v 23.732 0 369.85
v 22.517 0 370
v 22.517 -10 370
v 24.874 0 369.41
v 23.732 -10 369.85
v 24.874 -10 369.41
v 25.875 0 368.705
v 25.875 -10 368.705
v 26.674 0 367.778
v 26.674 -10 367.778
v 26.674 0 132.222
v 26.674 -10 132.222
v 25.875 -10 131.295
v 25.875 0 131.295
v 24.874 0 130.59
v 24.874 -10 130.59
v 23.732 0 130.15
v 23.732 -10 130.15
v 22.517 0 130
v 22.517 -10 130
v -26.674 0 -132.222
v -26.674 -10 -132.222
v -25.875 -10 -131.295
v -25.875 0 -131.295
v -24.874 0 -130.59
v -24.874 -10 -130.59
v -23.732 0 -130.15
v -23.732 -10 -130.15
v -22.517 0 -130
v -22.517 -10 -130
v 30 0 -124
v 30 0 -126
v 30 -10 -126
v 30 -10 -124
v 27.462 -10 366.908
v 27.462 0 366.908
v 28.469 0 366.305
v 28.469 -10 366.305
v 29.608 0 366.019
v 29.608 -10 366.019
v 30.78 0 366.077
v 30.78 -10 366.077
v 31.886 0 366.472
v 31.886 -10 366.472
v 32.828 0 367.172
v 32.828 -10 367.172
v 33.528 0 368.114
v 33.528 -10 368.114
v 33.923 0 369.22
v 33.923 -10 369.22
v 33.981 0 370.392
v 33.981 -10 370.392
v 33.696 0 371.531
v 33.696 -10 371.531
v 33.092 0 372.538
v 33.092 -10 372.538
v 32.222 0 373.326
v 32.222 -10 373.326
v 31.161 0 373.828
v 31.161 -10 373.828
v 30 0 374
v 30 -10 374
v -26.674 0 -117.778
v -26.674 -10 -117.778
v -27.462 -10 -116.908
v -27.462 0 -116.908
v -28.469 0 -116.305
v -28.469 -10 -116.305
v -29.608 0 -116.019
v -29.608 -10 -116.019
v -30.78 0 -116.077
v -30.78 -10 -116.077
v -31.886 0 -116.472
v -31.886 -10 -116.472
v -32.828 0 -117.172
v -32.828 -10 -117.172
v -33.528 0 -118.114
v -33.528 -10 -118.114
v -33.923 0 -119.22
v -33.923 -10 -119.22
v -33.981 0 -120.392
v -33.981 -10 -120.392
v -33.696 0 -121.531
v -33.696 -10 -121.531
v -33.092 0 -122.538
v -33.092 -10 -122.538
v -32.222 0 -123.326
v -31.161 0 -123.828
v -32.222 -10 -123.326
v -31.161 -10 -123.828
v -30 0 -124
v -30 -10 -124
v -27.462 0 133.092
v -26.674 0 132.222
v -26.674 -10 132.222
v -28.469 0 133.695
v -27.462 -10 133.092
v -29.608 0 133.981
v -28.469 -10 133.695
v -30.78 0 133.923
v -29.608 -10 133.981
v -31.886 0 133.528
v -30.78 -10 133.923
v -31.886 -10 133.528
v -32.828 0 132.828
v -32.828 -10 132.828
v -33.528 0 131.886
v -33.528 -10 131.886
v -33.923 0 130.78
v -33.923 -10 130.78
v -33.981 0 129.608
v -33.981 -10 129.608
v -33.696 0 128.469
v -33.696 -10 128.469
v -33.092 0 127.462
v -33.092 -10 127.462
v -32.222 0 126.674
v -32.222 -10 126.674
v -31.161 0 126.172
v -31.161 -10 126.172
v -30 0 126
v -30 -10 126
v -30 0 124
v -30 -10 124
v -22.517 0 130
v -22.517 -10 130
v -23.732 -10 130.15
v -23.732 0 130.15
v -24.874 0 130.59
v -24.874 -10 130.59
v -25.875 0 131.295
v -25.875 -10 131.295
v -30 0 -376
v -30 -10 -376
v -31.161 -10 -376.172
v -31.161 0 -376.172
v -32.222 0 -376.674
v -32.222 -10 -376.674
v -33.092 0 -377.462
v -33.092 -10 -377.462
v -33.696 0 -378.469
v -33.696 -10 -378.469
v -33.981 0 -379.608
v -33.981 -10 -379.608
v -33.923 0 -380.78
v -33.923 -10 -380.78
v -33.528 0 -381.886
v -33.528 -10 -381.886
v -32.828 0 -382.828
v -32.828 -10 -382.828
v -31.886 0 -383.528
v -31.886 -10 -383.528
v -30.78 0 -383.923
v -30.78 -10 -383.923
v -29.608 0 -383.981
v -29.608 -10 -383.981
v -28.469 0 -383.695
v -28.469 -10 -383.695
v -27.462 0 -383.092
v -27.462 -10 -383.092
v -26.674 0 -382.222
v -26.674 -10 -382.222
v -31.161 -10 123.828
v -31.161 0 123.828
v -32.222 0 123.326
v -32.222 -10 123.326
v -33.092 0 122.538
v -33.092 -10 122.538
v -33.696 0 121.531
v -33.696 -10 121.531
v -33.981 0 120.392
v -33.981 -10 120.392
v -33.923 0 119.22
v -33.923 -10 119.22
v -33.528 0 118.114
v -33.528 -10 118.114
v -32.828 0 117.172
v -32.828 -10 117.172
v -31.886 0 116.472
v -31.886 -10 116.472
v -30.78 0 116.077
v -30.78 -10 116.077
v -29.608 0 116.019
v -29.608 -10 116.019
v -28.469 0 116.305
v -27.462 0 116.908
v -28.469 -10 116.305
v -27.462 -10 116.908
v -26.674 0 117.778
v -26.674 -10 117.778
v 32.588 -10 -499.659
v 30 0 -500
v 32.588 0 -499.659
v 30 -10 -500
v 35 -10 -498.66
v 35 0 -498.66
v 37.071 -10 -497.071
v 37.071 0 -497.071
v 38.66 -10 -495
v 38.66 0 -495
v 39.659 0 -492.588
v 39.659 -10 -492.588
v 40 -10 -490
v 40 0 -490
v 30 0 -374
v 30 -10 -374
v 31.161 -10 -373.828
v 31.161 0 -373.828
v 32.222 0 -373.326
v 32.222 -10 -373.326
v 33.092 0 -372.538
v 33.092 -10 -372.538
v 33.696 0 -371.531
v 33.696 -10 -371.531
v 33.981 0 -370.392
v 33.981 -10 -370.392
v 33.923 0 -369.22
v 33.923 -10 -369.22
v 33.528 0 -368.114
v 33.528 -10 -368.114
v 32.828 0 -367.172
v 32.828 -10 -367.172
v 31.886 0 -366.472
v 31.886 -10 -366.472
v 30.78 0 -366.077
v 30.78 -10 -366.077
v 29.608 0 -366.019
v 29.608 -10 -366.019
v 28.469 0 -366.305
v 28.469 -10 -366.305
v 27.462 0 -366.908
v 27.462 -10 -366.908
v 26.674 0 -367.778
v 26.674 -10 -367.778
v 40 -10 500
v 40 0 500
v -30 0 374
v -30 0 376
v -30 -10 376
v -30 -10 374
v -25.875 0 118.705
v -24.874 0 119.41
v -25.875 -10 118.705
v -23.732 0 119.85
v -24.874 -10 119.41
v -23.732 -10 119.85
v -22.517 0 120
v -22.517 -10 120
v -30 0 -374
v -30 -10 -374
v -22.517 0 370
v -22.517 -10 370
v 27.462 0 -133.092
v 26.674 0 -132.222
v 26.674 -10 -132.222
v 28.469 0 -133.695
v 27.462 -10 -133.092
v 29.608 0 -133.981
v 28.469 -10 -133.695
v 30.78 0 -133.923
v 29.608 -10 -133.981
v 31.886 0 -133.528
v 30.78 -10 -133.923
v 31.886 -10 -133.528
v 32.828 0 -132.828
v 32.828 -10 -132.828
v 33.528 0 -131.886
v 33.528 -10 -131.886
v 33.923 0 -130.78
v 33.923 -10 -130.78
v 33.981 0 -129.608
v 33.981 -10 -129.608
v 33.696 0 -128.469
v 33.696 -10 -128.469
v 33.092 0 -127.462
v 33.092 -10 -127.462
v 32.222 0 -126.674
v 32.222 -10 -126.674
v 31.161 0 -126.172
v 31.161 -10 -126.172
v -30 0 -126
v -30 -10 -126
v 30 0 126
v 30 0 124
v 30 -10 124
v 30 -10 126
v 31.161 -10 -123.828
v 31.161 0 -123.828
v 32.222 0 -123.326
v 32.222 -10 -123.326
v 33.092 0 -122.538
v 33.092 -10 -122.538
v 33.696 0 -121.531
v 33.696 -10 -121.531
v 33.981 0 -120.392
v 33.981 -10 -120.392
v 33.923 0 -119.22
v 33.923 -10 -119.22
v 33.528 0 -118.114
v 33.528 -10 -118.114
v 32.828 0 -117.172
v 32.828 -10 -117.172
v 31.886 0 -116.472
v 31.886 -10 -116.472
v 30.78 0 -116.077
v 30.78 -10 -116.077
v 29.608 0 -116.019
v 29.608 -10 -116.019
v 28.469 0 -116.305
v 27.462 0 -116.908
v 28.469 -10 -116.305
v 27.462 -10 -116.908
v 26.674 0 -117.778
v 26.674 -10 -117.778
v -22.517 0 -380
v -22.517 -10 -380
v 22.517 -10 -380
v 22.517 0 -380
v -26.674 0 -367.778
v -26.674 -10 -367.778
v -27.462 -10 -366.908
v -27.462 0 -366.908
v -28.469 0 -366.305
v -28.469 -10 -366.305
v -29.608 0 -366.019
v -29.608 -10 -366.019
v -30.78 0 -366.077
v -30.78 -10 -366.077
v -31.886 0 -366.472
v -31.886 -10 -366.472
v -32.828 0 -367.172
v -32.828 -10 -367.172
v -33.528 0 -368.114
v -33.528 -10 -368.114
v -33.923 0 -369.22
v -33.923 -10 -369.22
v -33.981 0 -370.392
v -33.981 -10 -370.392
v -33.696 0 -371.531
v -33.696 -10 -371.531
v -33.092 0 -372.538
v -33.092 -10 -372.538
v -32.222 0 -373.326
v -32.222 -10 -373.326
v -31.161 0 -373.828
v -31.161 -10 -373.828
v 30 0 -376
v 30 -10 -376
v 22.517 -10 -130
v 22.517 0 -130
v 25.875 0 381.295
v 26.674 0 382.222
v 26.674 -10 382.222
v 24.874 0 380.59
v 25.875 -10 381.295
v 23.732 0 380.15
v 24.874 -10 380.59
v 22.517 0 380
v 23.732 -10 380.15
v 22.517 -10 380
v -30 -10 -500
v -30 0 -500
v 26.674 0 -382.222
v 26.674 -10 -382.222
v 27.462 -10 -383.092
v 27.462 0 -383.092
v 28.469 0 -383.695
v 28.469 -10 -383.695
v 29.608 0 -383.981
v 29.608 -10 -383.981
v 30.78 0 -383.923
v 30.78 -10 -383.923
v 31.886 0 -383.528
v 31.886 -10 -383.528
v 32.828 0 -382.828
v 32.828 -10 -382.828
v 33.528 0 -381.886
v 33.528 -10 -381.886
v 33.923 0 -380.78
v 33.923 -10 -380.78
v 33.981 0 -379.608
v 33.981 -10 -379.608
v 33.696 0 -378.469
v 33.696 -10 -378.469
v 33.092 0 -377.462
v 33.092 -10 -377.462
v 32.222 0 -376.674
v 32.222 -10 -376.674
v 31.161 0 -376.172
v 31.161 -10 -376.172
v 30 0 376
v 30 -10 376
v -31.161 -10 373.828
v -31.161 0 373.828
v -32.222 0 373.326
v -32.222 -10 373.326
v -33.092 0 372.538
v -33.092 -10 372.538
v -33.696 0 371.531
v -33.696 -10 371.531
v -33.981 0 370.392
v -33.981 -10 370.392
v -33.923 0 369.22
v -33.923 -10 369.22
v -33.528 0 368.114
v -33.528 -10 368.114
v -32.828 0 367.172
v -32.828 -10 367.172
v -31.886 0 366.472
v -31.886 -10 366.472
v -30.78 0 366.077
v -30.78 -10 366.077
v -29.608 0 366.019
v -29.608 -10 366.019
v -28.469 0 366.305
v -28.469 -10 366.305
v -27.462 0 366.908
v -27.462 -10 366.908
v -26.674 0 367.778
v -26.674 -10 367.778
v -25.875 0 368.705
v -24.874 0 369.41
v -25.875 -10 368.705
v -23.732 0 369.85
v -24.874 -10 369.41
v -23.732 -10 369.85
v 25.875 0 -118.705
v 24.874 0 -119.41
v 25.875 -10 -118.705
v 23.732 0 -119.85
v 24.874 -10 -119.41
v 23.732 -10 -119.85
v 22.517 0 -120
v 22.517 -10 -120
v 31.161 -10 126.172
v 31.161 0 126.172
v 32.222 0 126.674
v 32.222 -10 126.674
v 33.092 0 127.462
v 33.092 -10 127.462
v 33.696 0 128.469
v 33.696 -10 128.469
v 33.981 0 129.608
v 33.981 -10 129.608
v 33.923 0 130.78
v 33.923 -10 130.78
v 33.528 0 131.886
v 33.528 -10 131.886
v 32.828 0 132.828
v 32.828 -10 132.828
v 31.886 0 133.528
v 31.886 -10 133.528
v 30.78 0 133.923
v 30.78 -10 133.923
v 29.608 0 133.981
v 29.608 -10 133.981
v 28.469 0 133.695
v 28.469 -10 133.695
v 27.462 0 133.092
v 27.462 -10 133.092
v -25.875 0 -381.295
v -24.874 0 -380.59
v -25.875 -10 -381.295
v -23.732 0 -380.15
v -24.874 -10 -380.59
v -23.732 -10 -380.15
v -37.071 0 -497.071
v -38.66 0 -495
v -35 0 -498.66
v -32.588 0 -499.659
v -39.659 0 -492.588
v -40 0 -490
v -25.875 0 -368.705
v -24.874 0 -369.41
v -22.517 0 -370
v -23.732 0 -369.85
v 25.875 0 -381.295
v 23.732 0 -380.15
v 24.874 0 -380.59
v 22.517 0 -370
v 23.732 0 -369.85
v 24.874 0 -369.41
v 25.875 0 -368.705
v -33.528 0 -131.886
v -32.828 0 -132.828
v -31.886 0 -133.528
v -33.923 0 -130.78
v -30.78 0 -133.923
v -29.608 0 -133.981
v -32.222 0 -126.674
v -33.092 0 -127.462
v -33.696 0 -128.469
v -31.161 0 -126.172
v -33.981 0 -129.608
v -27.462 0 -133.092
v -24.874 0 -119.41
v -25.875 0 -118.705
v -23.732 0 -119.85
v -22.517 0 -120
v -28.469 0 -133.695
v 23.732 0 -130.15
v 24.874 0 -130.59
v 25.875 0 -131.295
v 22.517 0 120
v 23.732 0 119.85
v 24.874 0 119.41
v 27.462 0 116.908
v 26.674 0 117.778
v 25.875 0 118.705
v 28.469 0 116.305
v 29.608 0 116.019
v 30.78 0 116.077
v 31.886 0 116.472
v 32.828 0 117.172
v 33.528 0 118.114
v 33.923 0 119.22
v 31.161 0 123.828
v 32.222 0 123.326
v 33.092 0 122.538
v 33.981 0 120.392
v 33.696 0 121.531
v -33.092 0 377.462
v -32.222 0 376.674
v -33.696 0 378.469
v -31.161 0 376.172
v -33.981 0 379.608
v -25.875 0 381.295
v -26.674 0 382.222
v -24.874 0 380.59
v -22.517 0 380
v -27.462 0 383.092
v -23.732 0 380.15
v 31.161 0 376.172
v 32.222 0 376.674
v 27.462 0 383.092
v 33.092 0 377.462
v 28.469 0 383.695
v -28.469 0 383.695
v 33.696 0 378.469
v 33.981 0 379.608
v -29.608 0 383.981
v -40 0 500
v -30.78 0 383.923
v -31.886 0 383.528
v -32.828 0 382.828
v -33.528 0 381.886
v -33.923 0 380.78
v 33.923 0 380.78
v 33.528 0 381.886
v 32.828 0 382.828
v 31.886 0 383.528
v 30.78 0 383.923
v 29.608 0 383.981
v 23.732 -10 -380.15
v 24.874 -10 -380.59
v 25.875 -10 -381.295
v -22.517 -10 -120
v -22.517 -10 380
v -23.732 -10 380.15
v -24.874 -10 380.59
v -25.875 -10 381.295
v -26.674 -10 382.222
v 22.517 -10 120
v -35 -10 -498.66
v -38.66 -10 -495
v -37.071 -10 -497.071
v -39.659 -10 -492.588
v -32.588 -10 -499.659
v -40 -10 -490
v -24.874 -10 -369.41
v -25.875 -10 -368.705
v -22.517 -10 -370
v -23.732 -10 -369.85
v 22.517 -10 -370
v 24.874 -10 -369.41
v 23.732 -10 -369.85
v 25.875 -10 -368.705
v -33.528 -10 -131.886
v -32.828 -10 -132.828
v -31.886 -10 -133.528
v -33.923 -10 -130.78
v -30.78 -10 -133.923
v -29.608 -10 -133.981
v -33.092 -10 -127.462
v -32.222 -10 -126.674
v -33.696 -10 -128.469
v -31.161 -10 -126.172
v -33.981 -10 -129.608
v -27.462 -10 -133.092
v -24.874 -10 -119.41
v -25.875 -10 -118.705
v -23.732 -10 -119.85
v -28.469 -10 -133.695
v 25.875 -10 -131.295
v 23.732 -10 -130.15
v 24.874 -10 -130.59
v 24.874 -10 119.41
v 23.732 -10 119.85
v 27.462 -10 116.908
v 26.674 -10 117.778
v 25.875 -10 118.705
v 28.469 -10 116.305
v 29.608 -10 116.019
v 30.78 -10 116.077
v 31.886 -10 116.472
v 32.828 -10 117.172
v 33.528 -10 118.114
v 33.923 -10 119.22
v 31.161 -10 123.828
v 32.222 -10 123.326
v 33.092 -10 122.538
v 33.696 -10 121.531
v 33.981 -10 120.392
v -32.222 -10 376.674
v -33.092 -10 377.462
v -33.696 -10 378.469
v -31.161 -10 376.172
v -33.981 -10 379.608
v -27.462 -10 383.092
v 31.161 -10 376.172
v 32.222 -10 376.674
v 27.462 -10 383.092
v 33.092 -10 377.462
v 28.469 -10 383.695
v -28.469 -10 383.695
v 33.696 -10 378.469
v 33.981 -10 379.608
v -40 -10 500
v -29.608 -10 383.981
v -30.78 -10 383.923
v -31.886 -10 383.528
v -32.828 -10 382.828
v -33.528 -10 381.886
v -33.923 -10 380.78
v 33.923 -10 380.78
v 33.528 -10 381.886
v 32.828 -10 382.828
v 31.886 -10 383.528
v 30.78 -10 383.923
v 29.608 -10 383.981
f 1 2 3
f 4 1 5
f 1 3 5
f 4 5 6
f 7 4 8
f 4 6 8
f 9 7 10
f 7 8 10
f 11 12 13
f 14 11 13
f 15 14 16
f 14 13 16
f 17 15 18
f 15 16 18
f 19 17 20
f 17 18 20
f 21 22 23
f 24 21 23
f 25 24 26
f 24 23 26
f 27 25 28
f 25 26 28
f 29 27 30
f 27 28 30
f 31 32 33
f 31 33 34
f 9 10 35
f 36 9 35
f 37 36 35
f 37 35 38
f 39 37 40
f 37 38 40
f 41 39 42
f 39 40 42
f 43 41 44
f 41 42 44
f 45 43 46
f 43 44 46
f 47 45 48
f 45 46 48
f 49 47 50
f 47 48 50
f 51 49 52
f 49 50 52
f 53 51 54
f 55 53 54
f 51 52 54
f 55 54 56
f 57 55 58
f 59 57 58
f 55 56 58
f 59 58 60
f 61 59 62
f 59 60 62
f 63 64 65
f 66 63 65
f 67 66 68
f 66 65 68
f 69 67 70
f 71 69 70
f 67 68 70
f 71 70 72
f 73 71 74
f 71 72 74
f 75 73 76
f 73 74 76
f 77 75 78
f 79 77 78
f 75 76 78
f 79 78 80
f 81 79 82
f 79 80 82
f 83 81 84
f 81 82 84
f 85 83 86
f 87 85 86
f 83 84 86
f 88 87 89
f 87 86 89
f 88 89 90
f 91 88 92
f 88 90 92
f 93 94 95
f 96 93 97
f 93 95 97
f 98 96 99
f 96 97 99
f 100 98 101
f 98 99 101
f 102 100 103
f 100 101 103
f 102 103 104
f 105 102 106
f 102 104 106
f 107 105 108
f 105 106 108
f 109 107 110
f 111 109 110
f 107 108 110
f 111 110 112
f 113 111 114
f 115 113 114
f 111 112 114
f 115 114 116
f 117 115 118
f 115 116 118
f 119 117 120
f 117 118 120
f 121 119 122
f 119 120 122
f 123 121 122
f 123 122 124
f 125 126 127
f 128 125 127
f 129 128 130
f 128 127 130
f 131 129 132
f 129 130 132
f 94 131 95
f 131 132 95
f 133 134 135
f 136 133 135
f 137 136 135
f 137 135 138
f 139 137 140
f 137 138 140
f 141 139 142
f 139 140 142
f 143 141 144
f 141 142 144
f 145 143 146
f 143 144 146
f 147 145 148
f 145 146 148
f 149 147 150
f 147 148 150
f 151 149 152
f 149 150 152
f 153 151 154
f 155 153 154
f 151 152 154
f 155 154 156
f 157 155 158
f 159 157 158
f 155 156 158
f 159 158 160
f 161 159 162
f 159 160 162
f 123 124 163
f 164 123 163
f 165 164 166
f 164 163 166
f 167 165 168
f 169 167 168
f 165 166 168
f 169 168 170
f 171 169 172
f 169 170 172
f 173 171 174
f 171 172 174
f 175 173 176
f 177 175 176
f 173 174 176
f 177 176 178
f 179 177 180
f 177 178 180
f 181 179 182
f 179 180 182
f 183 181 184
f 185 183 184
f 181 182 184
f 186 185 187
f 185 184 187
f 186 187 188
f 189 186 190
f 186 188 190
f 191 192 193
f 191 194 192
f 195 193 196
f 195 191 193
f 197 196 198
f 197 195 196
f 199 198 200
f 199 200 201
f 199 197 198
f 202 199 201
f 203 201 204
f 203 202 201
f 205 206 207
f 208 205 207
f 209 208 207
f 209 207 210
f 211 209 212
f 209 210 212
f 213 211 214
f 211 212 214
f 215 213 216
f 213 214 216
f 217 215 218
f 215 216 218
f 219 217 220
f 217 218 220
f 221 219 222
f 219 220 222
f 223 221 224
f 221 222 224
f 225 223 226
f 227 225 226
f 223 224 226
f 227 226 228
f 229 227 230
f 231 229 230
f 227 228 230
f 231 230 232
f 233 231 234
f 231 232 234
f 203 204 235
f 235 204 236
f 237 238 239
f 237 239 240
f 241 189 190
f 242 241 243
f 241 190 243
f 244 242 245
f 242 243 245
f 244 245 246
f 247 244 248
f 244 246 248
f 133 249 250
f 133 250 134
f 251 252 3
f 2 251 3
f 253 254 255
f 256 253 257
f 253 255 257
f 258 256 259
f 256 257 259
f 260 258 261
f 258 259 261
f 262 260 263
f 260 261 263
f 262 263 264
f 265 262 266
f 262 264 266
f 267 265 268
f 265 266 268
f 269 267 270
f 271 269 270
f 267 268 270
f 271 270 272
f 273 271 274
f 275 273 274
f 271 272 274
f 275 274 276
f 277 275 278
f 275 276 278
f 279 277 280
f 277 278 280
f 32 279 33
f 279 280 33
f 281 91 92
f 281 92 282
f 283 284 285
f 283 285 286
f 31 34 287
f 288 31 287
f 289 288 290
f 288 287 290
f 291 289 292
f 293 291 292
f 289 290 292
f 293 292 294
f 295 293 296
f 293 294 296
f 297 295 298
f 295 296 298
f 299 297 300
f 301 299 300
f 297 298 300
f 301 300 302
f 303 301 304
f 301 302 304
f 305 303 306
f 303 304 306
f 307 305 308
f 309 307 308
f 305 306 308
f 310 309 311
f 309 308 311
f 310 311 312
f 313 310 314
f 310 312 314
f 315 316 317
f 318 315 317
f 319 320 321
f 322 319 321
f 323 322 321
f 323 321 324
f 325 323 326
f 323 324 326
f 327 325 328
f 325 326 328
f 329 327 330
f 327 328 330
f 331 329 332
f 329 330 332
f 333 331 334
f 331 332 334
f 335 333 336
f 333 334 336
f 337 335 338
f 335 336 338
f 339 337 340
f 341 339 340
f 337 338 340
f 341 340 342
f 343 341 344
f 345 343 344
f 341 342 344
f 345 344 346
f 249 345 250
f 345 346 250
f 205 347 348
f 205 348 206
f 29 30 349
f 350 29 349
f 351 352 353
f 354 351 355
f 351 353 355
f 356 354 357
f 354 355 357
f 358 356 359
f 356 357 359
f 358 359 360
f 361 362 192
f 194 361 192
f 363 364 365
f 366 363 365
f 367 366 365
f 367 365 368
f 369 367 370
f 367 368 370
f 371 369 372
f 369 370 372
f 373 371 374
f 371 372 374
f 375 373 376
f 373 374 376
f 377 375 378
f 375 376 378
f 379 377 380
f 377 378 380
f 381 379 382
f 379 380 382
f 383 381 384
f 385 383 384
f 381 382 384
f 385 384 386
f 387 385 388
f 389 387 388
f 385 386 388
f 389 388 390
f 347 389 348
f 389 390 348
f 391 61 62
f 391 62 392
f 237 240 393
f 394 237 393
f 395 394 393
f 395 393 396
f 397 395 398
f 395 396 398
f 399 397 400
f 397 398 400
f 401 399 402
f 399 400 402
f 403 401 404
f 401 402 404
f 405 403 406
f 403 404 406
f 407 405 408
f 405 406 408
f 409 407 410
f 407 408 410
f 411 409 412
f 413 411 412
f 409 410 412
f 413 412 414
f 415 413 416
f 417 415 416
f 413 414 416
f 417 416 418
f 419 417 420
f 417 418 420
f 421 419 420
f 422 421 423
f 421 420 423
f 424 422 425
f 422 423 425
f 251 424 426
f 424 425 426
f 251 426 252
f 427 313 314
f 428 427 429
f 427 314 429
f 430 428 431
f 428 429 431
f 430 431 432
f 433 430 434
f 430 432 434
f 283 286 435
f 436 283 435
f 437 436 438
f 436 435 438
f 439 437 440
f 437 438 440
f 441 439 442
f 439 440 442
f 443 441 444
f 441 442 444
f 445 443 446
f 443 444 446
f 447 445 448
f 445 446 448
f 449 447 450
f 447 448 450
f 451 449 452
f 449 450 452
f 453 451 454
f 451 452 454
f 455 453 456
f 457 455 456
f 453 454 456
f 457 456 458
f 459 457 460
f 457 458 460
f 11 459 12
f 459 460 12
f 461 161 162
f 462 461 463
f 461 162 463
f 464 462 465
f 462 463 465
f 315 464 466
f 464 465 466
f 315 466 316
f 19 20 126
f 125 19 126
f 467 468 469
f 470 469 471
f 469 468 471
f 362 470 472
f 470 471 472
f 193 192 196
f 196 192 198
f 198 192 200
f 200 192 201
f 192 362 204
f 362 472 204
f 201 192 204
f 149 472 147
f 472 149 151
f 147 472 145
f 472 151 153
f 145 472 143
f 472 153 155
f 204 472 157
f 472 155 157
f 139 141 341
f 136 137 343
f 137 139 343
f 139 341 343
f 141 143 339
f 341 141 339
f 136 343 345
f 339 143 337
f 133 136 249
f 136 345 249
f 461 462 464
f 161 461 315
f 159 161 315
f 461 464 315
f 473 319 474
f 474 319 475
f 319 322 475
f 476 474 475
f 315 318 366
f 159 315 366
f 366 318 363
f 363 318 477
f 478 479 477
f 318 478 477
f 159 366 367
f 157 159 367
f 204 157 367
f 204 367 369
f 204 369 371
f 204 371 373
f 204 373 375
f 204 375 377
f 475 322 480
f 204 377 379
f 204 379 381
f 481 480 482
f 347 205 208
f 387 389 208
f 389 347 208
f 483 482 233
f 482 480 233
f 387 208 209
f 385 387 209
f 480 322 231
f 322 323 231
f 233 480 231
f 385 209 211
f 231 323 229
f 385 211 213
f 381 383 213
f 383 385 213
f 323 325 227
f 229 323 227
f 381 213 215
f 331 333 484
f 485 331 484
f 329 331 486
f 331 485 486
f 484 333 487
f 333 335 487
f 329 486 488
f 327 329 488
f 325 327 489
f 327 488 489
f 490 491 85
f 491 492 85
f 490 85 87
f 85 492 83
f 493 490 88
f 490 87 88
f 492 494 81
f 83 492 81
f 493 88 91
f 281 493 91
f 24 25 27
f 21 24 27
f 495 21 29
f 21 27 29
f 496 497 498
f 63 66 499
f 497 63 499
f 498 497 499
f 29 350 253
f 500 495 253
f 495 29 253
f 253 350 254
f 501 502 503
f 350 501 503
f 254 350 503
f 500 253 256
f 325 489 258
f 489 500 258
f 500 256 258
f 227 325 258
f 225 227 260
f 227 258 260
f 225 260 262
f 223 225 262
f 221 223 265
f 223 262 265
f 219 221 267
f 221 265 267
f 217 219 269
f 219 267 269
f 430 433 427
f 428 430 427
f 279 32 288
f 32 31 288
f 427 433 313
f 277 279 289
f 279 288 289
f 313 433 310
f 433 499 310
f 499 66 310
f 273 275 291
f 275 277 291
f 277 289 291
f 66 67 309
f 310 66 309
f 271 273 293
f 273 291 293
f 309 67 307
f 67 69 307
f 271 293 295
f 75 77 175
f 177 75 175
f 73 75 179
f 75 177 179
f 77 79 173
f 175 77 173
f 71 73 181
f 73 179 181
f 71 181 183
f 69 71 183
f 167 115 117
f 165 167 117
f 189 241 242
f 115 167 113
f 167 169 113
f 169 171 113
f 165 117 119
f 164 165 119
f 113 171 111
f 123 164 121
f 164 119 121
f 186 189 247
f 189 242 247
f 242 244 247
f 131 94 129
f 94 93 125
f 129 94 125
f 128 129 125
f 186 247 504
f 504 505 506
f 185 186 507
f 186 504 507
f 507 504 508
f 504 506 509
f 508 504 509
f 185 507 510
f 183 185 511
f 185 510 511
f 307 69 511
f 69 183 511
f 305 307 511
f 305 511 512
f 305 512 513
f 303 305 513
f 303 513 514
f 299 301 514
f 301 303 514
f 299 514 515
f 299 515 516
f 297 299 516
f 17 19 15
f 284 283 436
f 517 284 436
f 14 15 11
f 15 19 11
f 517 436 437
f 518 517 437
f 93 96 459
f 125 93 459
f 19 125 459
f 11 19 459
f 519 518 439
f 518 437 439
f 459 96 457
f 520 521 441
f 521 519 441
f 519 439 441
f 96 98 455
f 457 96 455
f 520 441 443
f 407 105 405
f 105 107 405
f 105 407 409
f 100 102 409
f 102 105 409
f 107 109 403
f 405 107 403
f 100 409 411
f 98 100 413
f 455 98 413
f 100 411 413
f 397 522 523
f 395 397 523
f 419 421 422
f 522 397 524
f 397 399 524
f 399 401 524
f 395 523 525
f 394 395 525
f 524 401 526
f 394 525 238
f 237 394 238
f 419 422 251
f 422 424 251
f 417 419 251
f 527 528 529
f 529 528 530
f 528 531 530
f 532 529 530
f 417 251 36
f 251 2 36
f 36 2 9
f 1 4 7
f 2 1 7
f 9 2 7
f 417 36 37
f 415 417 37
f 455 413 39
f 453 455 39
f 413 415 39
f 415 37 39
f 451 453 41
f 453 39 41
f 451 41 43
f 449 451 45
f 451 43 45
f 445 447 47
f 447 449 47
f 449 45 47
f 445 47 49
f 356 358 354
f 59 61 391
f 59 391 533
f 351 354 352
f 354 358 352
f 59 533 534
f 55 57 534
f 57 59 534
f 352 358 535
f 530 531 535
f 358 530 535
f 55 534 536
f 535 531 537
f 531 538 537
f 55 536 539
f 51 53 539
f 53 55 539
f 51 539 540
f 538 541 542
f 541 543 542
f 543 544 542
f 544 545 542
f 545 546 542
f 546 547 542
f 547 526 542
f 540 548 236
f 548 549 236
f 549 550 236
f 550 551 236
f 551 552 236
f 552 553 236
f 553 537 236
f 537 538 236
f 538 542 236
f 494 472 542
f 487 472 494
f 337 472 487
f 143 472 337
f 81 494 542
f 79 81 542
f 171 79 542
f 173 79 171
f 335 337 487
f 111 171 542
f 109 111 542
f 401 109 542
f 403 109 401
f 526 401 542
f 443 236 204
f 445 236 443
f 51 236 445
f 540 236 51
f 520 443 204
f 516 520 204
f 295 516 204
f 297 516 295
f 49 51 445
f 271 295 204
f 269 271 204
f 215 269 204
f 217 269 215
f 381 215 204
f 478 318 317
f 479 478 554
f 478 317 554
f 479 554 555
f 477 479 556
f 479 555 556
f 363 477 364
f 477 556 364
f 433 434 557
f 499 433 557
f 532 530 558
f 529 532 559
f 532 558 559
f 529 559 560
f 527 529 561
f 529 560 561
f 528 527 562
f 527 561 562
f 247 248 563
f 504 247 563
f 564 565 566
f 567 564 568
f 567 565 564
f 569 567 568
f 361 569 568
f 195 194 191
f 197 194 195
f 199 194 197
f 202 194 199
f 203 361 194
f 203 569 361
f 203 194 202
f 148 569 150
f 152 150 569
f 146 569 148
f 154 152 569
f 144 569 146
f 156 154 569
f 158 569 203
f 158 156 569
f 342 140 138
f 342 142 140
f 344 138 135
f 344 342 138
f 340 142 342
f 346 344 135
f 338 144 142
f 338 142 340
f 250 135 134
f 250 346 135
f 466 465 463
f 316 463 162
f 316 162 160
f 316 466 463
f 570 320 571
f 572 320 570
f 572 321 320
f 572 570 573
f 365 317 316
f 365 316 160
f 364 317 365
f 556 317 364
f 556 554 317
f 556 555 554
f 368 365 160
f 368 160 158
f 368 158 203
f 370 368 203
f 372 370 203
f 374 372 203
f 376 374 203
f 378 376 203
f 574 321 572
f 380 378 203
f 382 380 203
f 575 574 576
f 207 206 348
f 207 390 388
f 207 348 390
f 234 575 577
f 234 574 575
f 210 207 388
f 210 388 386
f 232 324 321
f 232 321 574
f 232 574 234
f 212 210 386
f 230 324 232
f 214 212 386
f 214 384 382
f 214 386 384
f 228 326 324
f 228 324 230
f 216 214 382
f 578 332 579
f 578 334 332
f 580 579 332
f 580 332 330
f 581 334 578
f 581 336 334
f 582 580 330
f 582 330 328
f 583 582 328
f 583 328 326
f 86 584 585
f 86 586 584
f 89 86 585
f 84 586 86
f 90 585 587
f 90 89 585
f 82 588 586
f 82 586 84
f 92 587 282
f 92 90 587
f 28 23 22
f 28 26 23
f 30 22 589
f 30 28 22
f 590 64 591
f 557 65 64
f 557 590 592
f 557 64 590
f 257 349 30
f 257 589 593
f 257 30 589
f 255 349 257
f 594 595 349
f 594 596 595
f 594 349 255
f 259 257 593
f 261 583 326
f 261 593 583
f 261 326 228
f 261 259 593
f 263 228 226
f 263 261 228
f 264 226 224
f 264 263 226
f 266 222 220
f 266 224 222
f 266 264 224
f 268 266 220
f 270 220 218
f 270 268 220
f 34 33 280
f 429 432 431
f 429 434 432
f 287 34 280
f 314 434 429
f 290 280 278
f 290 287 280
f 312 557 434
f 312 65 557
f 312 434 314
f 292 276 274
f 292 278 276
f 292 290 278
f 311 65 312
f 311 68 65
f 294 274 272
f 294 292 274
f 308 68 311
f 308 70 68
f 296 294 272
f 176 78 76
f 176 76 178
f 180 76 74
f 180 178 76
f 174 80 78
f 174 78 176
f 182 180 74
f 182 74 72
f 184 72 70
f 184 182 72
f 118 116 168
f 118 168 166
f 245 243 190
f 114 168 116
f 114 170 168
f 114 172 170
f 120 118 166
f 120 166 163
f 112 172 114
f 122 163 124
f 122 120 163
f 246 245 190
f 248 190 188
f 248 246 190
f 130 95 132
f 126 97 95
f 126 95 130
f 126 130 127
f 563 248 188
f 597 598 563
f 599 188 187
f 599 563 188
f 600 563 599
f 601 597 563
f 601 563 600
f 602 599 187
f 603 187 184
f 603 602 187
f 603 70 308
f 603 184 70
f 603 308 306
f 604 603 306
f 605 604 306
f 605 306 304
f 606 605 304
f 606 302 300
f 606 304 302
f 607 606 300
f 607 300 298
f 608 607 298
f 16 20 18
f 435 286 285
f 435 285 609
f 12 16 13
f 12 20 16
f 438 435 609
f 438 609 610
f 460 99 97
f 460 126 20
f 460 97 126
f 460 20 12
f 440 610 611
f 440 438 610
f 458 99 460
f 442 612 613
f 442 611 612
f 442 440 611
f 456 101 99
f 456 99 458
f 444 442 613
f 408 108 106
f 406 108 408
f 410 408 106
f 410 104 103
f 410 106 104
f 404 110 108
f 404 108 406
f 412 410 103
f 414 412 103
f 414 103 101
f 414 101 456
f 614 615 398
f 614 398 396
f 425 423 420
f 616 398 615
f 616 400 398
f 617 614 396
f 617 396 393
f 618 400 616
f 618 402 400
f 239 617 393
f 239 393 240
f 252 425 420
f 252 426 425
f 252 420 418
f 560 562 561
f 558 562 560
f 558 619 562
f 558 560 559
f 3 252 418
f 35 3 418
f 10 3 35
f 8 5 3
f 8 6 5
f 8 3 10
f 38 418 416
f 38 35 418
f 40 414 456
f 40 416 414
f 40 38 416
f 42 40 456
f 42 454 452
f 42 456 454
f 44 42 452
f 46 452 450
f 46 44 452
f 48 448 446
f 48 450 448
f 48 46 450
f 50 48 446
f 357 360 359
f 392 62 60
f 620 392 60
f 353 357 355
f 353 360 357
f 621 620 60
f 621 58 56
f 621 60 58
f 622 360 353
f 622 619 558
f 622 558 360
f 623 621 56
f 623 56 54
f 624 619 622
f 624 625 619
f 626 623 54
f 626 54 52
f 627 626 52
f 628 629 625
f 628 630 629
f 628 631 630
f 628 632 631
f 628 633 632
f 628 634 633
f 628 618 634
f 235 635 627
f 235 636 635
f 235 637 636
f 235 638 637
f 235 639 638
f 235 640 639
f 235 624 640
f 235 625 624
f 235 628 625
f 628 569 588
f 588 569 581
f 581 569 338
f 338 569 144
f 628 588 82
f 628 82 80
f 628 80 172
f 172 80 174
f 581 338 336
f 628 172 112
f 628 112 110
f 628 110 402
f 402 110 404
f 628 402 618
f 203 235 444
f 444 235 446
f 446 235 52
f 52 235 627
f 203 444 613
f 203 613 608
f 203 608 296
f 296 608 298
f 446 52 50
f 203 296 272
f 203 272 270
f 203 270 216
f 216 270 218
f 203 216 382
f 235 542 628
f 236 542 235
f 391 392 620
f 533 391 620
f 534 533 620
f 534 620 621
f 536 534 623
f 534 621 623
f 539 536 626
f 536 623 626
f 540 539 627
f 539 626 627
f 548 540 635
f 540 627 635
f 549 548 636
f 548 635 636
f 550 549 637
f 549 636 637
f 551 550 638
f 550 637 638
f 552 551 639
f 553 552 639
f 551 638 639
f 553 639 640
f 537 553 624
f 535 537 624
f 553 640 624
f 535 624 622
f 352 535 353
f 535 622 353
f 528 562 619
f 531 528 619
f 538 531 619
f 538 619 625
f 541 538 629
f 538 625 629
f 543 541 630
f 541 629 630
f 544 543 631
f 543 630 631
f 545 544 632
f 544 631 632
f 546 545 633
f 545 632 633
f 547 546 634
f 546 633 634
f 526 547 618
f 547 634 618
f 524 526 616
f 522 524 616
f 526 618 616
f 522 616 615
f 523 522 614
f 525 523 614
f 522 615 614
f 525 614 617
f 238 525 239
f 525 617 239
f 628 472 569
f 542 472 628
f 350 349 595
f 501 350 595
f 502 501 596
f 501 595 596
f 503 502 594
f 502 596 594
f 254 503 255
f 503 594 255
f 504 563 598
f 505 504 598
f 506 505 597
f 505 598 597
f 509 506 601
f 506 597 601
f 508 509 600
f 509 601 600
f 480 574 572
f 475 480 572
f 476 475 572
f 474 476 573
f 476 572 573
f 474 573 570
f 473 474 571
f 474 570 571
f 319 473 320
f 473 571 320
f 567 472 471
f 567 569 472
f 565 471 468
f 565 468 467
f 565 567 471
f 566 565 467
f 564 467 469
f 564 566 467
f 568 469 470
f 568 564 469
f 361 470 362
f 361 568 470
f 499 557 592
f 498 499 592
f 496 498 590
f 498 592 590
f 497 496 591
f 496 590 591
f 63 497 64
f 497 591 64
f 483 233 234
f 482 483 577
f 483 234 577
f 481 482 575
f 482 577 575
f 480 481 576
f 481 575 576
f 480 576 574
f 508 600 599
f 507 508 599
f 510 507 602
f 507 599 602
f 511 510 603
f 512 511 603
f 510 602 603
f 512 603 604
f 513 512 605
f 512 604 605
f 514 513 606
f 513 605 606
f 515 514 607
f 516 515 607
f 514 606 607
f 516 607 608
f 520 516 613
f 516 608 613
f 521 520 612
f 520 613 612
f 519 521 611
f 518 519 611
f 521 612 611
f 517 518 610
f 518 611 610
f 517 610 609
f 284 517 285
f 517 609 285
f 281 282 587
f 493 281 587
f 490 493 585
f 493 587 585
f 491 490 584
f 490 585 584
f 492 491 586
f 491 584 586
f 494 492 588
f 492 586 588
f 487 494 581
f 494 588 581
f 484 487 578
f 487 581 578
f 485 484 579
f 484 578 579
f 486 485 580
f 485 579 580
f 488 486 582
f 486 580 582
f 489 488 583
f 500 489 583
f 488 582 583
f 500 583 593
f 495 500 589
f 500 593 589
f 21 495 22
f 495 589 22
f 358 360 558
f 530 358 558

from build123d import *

# Parameters (mm, degrees)
F1_W     = 80
F1_H     = 1000
F2_DEPTH = 10
F3_R     = 10
F5_DEPTH = 10.001


with BuildPart() as f2:
    # F1 (on Front) → F2 (new body)
    with BuildSketch(Plane.XZ):
        Rectangle(F1_W, F1_H)
    extrude(amount=F2_DEPTH)

    # F3
    f3_edges = [f2.edges().sort_by_distance(p)[0] for p in [
        (40, -5, -500),
        (-40, -5, -500),
    ]]
    fillet(f3_edges, radius=F3_R)

    # F4 (on face) → F5 (cut, through all)
    with BuildSketch(Plane.XZ.offset(10)):
        with BuildLine():
            Line((-22.5166852265, -380), (22.5166852265, -380))
            ThreePointArc((22.5166852265, -380), (24.8737078304, -380.5904144816), (26.6740823229, -382.2222222222))
            ThreePointArc((26.6740823229, -382.2222222222), (33.5276684148, -381.8856180832), (30, -376))
            Line((30, -376), (30, -374))
            ThreePointArc((30, -374), (33.5276684148, -368.1143819168), (26.6740823229, -367.7777777778))
            ThreePointArc((26.6740823229, -367.7777777778), (24.8737078304, -369.4095855184), (22.5166852265, -370))
            Line((22.5166852265, -370), (-22.5166852265, -370))
            ThreePointArc((-22.5166852265, -370), (-24.8737078304, -369.4095855184), (-26.6740823229, -367.7777777778))
            ThreePointArc((-26.6740823229, -367.7777777778), (-33.5276684148, -368.1143819168), (-30, -374))
            Line((-30, -374), (-30, -376))
            ThreePointArc((-30, -376), (-33.5276684148, -381.8856180832), (-26.6740823229, -382.2222222222))
            ThreePointArc((-26.6740823229, -382.2222222222), (-24.8737078304, -380.5904144816), (-22.5166852265, -380))
        make_face()
        with BuildLine():
            Line((30, -126), (30, -124))
            ThreePointArc((30, -124), (33.5276684148, -118.1143819168), (26.6740823229, -117.7777777778))
            ThreePointArc((26.6740823229, -117.7777777778), (24.8737078304, -119.4095855184), (22.5166852265, -120))
            Line((22.5166852265, -120), (-22.5166852265, -120))
            ThreePointArc((-22.5166852265, -120), (-24.8737078304, -119.4095855184), (-26.6740823229, -117.7777777778))
            ThreePointArc((-26.6740823229, -117.7777777778), (-33.5276684148, -118.1143819168), (-30, -124))
            Line((-30, -124), (-30, -126))
            ThreePointArc((-30, -126), (-33.5276684148, -131.8856180832), (-26.6740823229, -132.2222222222))
            ThreePointArc((-26.6740823229, -132.2222222222), (-24.8737078304, -130.5904144816), (-22.5166852265, -130))
            Line((-22.5166852265, -130), (22.5166852265, -130))
            ThreePointArc((22.5166852265, -130), (24.8737078304, -130.5904144816), (26.6740823229, -132.2222222222))
            ThreePointArc((26.6740823229, -132.2222222222), (33.5276684148, -131.8856180832), (30, -126))
        make_face()
        with BuildLine():
            Line((30, 124), (30, 126))
            ThreePointArc((30, 126), (33.5276684148, 131.8856180832), (26.6740823229, 132.2222222222))
            ThreePointArc((26.6740823229, 132.2222222222), (24.8737078304, 130.5904144816), (22.5166852265, 130))
            Line((22.5166852265, 130), (-22.5166852265, 130))
            ThreePointArc((-22.5166852265, 130), (-24.8737078304, 130.5904144816), (-26.6740823229, 132.2222222222))
            ThreePointArc((-26.6740823229, 132.2222222222), (-33.5276684148, 131.8856180832), (-30, 126))
            Line((-30, 126), (-30, 124))
            ThreePointArc((-30, 124), (-33.5276684148, 118.1143819168), (-26.6740823229, 117.7777777778))
            ThreePointArc((-26.6740823229, 117.7777777778), (-24.8737078304, 119.4095855184), (-22.5166852265, 120))
            Line((-22.5166852265, 120), (22.5166852265, 120))
            ThreePointArc((22.5166852265, 120), (24.8737078304, 119.4095855184), (26.6740823229, 117.7777777778))
            ThreePointArc((26.6740823229, 117.7777777778), (33.5276684148, 118.1143819168), (30, 124))
        make_face()
        with BuildLine():
            Line((30, 374), (30, 376))
            ThreePointArc((30, 376), (33.5276684148, 381.8856180832), (26.6740823229, 382.2222222222))
            ThreePointArc((26.6740823229, 382.2222222222), (24.8737078304, 380.5904144816), (22.5166852265, 380))
            Line((22.5166852265, 380), (-22.5166852265, 380))
            ThreePointArc((-22.5166852265, 380), (-24.8737078304, 380.5904144816), (-26.6740823229, 382.2222222222))
            ThreePointArc((-26.6740823229, 382.2222222222), (-33.5276684148, 381.8856180832), (-30, 376))
            Line((-30, 376), (-30, 374))
            ThreePointArc((-30, 374), (-33.5276684148, 368.1143819168), (-26.6740823229, 367.7777777778))
            ThreePointArc((-26.6740823229, 367.7777777778), (-24.8737078304, 369.4095855184), (-22.5166852265, 370))
            Line((-22.5166852265, 370), (22.5166852265, 370))
            ThreePointArc((22.5166852265, 370), (24.8737078304, 369.4095855184), (26.6740823229, 367.7777777778))
            ThreePointArc((26.6740823229, 367.7777777778), (33.5276684148, 368.1143819168), (30, 374))
        make_face()
    extrude(amount=-F5_DEPTH, mode=Mode.SUBTRACT)


solid = f2.part
